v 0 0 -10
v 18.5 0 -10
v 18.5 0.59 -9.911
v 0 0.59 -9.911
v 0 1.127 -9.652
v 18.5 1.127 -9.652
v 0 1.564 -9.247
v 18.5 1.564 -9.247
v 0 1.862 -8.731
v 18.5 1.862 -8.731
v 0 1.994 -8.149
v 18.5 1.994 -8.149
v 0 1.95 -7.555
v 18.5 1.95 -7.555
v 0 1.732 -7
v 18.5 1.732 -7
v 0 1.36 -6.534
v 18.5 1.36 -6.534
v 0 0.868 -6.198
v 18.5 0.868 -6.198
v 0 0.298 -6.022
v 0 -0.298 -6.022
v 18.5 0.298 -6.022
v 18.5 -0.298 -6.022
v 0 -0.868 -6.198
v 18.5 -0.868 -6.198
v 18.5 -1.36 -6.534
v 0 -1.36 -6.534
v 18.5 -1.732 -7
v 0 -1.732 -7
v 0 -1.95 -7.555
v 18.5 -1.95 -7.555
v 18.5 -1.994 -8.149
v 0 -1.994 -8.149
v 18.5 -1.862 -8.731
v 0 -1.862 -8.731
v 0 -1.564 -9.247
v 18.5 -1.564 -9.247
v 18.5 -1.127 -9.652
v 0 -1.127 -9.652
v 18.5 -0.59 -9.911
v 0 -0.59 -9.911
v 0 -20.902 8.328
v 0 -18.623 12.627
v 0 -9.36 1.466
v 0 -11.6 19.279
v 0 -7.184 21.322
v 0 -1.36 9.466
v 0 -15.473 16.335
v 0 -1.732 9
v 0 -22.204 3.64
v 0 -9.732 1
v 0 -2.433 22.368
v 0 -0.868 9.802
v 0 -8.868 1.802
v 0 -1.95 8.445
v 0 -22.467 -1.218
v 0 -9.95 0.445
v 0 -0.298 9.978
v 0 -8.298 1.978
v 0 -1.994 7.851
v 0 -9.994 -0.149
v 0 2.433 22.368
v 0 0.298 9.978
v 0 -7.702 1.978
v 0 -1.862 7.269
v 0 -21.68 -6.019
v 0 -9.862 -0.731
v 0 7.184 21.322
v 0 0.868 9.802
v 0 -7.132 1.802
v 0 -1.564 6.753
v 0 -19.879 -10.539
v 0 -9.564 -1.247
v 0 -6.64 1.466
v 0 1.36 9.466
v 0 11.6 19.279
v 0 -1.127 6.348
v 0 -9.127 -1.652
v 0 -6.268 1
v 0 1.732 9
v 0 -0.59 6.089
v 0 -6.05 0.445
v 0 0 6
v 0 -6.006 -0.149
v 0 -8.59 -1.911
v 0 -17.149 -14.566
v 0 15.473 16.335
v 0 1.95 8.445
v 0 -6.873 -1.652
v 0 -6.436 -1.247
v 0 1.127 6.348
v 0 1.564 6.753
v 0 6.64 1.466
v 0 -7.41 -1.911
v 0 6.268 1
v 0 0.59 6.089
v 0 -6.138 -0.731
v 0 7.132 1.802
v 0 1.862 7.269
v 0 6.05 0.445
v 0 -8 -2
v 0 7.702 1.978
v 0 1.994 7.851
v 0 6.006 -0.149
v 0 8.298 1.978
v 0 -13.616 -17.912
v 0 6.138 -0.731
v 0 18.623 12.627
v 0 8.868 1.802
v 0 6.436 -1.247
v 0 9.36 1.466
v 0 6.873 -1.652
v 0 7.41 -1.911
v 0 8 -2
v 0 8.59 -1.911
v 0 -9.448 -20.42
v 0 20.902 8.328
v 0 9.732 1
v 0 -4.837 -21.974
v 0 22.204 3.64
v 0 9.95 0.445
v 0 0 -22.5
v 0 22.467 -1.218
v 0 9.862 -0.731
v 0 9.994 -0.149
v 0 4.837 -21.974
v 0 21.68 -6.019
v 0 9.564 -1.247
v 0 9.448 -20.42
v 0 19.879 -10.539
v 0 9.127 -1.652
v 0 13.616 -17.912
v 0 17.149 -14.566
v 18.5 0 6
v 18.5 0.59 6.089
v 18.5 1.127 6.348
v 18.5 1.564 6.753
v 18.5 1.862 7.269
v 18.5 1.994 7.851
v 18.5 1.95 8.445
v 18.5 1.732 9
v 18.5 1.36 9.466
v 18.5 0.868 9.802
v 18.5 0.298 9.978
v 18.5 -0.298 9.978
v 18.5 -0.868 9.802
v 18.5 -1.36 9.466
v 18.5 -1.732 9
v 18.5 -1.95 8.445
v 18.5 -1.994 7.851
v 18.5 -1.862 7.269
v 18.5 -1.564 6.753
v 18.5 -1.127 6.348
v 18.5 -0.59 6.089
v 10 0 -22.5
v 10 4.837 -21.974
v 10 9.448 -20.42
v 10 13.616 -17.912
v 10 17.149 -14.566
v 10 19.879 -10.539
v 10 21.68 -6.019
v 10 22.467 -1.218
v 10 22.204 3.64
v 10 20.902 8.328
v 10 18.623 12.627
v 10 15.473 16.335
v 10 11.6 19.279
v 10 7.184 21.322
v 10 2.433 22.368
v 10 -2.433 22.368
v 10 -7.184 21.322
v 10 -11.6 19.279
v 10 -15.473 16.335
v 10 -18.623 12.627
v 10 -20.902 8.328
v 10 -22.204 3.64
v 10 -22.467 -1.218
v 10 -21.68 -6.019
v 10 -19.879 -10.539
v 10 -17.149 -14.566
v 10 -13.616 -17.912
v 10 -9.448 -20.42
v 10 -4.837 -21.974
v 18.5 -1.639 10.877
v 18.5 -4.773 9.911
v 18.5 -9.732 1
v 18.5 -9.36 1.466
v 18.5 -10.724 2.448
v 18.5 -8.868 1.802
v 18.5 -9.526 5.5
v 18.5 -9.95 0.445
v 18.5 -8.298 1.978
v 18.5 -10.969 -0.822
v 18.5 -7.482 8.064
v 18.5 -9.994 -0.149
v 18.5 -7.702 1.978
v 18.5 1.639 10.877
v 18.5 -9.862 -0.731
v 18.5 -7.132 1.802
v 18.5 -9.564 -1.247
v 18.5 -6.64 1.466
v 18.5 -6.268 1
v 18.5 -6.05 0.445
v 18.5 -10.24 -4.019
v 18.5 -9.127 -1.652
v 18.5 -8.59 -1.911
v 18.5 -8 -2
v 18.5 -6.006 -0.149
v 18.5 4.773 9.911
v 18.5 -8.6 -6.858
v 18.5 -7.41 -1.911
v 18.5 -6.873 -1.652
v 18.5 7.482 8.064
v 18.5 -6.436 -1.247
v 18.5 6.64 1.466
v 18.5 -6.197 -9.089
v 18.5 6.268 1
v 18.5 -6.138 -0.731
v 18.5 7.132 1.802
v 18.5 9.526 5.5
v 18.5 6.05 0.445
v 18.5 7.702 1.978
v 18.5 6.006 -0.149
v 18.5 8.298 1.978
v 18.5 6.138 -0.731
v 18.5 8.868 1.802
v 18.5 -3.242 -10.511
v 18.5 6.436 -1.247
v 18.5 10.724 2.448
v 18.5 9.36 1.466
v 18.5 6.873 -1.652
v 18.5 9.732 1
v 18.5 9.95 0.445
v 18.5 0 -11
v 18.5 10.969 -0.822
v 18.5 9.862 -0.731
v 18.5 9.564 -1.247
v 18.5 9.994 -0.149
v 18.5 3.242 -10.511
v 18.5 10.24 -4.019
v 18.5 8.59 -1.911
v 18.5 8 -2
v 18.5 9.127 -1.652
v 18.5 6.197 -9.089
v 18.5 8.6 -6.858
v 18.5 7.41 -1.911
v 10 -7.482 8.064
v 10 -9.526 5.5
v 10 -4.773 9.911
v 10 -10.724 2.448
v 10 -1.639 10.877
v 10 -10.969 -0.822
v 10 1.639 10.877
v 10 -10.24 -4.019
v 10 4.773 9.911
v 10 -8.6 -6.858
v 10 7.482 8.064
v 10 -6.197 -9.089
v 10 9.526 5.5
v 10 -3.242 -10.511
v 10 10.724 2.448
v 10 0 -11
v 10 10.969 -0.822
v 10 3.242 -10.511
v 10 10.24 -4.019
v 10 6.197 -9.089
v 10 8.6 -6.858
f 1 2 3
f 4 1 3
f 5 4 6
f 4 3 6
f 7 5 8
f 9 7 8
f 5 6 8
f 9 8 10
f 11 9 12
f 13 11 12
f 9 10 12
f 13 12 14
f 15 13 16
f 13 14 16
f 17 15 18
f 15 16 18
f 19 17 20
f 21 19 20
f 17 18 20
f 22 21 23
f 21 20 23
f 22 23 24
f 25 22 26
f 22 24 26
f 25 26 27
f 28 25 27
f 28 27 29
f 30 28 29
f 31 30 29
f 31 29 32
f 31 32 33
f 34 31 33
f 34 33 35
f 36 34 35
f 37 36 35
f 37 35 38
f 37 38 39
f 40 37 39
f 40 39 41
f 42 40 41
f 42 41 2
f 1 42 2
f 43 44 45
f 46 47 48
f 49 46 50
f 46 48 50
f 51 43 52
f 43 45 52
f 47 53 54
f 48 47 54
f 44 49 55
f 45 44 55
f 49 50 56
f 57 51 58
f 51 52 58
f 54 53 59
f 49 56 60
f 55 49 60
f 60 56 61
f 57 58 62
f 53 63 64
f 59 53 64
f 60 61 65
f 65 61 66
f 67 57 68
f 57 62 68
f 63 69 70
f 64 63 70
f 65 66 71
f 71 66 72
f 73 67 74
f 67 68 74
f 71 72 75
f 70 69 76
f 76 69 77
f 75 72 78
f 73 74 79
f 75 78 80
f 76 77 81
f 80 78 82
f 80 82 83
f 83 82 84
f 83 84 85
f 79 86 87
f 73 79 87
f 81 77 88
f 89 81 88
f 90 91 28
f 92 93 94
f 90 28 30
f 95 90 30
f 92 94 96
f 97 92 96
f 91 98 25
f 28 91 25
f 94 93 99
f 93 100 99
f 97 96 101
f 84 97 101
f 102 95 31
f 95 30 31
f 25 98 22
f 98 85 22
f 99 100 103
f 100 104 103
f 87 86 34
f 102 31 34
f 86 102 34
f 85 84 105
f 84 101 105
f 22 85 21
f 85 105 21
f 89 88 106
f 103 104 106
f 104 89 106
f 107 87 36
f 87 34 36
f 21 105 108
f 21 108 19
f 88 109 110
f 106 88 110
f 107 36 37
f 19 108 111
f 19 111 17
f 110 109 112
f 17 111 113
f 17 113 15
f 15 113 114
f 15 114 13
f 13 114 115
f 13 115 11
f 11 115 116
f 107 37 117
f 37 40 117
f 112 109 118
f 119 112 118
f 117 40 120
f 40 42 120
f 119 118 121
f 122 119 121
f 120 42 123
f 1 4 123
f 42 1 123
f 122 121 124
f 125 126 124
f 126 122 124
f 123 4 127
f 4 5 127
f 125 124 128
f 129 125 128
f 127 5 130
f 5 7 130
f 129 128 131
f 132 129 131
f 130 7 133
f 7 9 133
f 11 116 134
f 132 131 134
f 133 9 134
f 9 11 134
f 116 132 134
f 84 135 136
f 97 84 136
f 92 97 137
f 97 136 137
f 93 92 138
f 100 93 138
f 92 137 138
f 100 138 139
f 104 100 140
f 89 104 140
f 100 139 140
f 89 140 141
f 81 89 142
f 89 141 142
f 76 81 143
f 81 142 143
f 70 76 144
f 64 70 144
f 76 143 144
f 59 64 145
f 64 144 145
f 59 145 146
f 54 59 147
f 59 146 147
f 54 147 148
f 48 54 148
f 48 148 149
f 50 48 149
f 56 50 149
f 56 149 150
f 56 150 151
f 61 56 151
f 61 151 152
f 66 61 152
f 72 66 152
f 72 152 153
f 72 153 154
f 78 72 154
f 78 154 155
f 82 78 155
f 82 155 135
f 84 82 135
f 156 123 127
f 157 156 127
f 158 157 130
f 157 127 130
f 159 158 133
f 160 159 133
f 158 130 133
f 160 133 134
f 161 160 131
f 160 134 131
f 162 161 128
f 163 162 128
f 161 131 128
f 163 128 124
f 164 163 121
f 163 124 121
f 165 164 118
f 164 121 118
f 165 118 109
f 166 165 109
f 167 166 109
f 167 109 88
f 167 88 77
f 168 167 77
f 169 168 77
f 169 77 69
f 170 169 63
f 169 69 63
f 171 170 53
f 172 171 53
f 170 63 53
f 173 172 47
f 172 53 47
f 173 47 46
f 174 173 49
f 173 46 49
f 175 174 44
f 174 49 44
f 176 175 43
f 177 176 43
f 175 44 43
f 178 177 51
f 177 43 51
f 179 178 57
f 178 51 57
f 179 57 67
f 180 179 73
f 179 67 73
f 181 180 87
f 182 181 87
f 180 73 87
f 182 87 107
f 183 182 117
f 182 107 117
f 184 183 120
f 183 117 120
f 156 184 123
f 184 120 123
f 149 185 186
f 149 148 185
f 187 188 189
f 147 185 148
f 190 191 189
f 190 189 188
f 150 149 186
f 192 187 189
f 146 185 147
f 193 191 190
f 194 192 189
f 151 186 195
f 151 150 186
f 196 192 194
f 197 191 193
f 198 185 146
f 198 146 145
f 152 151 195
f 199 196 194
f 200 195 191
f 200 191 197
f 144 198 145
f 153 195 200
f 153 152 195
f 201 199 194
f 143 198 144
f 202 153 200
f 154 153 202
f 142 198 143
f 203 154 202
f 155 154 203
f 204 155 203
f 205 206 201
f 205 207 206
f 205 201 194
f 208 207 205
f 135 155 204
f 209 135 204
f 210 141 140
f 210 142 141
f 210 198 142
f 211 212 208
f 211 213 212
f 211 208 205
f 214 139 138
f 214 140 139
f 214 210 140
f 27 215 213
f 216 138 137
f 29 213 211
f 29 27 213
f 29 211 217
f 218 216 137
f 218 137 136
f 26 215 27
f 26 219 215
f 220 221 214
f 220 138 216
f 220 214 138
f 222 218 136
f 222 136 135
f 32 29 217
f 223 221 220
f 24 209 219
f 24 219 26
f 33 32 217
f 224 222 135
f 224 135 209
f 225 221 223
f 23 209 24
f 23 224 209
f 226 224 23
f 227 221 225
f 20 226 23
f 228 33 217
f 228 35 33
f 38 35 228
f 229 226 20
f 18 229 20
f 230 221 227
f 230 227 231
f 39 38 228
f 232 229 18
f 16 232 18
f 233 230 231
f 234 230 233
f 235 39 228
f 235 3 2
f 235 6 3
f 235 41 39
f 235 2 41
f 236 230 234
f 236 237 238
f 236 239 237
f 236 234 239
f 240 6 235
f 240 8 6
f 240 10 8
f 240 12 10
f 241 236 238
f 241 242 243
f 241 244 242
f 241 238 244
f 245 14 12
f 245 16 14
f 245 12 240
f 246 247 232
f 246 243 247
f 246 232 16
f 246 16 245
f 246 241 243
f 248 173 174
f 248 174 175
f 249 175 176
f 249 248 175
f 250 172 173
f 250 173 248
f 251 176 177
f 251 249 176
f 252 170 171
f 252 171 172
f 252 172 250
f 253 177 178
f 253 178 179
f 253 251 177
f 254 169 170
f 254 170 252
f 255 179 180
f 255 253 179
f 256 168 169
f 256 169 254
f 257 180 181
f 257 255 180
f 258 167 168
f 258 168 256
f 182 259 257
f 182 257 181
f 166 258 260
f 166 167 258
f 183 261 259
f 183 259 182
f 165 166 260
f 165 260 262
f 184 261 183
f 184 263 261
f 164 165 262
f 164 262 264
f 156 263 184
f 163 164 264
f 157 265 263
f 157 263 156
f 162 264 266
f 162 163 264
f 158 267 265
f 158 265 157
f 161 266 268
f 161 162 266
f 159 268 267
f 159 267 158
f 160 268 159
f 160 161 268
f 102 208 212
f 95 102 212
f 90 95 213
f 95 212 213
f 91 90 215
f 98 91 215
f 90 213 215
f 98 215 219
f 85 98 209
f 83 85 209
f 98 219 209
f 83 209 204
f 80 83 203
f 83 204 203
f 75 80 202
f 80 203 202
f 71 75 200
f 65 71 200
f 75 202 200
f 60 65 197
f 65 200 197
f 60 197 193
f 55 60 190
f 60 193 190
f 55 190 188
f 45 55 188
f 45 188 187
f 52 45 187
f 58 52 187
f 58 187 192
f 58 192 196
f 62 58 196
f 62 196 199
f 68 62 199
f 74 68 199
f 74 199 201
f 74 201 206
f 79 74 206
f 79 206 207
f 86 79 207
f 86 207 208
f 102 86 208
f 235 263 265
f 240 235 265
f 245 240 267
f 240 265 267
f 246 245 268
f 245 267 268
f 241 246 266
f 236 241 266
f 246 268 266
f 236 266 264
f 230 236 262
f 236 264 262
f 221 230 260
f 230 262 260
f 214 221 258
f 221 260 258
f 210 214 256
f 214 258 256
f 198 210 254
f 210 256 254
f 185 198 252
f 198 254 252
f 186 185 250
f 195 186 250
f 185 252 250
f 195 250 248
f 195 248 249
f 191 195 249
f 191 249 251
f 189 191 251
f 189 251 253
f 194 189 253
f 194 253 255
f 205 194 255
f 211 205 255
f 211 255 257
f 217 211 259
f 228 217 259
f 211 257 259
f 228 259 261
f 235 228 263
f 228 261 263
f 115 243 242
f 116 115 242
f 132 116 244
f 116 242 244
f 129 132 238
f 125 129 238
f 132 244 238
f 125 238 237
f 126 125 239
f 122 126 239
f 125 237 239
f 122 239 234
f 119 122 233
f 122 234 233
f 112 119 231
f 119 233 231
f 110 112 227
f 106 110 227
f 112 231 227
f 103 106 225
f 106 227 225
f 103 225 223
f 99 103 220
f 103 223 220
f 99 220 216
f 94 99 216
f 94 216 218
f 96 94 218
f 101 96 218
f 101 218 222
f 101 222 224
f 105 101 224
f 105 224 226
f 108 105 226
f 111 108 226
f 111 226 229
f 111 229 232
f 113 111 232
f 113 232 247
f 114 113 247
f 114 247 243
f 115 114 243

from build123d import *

# Parameters (mm, degrees)
SKETCH3_R           = 22.5
BOSS_EXTRUDE1_DEPTH = 10
SKETCH4_R           = 11
BOSS_EXTRUDE2_DEPTH = 8.5
SKETCH5_R           = 2
CUT_EXTRUDE1_DEPTH  = 37.806928696


with BuildPart() as part:
    # Sketch3 → Boss-Extrude1 (new body)
    with BuildSketch(Plane(origin=(0, 0, 0), x_dir=(0, 0, -1), z_dir=(1, 0, 0))):
        Circle(SKETCH3_R)
    extrude(amount=BOSS_EXTRUDE1_DEPTH)

    # Sketch4 → Boss-Extrude2 (add)
    with BuildSketch(Plane(origin=(10, 0, 0), x_dir=(0, 0, -1), z_dir=(1, 0, 0))):
        Circle(SKETCH4_R)
    extrude(amount=BOSS_EXTRUDE2_DEPTH)

    # Sketch5 → Cut-Extrude1 (cut, through all)
    with BuildSketch(Plane(origin=(18.5, 0, 0), x_dir=(0, 0, -1), z_dir=(1, 0, 0))):
        with Locations((0, 8)):
            Circle(SKETCH5_R)
        with Locations((8, 0)):
            Circle(SKETCH5_R)
        with Locations((0, -8)):
            Circle(SKETCH5_R)
        with Locations((-8, 0)):
            Circle(SKETCH5_R)
    extrude(amount=-CUT_EXTRUDE1_DEPTH, mode=Mode.SUBTRACT)


solid = part.part
